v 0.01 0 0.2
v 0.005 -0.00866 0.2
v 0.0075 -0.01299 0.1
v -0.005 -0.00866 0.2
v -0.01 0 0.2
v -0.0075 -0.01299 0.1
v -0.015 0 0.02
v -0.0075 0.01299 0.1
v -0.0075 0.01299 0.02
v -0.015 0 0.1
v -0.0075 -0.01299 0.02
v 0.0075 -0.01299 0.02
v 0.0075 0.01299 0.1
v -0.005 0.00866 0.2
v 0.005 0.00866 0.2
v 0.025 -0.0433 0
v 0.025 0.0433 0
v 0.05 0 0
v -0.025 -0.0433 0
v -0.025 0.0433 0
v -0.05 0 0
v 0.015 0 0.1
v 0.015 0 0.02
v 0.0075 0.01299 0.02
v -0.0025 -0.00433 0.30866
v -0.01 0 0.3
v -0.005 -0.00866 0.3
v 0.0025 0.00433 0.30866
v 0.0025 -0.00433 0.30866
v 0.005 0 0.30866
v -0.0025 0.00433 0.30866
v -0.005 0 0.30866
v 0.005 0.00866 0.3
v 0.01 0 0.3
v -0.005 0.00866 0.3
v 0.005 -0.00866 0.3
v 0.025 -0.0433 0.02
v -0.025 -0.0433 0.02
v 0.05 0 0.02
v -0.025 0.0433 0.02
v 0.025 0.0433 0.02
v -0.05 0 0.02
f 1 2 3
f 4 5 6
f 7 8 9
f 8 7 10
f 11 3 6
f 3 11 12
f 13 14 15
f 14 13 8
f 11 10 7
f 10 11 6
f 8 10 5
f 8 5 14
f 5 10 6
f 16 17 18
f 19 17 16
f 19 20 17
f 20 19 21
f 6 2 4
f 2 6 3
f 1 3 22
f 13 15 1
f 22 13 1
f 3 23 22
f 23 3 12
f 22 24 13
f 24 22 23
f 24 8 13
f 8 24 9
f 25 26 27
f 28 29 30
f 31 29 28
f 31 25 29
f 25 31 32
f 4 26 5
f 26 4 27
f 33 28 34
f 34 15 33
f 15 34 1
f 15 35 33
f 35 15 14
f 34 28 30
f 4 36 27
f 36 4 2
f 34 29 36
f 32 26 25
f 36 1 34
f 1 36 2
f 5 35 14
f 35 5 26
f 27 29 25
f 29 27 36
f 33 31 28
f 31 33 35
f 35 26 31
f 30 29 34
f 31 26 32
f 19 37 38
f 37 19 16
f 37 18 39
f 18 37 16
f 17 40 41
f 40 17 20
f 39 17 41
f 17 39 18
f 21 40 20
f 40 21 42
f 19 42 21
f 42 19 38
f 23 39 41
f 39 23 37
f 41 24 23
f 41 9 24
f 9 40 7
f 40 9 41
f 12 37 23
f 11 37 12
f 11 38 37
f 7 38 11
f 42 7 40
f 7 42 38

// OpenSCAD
use <lib.scad>

module aerial() {
	union() {
		hull() {
			translate([0,0,0.2]) sphere(0.01);
			#translate([0,0,0.05]) cyl(0.015, 0.015, 0.1);
		}
		hull() {
			translate([0,0,0.3]) sphere(0.01);
			translate([0,0,0.2]) sphere(0.01);
		}
	}
}

module base() {
	translate([0,0,0.01]) cyl(0.05, 0.05, 0.02);
}

aerial($fn=6);
base($fn=6);
